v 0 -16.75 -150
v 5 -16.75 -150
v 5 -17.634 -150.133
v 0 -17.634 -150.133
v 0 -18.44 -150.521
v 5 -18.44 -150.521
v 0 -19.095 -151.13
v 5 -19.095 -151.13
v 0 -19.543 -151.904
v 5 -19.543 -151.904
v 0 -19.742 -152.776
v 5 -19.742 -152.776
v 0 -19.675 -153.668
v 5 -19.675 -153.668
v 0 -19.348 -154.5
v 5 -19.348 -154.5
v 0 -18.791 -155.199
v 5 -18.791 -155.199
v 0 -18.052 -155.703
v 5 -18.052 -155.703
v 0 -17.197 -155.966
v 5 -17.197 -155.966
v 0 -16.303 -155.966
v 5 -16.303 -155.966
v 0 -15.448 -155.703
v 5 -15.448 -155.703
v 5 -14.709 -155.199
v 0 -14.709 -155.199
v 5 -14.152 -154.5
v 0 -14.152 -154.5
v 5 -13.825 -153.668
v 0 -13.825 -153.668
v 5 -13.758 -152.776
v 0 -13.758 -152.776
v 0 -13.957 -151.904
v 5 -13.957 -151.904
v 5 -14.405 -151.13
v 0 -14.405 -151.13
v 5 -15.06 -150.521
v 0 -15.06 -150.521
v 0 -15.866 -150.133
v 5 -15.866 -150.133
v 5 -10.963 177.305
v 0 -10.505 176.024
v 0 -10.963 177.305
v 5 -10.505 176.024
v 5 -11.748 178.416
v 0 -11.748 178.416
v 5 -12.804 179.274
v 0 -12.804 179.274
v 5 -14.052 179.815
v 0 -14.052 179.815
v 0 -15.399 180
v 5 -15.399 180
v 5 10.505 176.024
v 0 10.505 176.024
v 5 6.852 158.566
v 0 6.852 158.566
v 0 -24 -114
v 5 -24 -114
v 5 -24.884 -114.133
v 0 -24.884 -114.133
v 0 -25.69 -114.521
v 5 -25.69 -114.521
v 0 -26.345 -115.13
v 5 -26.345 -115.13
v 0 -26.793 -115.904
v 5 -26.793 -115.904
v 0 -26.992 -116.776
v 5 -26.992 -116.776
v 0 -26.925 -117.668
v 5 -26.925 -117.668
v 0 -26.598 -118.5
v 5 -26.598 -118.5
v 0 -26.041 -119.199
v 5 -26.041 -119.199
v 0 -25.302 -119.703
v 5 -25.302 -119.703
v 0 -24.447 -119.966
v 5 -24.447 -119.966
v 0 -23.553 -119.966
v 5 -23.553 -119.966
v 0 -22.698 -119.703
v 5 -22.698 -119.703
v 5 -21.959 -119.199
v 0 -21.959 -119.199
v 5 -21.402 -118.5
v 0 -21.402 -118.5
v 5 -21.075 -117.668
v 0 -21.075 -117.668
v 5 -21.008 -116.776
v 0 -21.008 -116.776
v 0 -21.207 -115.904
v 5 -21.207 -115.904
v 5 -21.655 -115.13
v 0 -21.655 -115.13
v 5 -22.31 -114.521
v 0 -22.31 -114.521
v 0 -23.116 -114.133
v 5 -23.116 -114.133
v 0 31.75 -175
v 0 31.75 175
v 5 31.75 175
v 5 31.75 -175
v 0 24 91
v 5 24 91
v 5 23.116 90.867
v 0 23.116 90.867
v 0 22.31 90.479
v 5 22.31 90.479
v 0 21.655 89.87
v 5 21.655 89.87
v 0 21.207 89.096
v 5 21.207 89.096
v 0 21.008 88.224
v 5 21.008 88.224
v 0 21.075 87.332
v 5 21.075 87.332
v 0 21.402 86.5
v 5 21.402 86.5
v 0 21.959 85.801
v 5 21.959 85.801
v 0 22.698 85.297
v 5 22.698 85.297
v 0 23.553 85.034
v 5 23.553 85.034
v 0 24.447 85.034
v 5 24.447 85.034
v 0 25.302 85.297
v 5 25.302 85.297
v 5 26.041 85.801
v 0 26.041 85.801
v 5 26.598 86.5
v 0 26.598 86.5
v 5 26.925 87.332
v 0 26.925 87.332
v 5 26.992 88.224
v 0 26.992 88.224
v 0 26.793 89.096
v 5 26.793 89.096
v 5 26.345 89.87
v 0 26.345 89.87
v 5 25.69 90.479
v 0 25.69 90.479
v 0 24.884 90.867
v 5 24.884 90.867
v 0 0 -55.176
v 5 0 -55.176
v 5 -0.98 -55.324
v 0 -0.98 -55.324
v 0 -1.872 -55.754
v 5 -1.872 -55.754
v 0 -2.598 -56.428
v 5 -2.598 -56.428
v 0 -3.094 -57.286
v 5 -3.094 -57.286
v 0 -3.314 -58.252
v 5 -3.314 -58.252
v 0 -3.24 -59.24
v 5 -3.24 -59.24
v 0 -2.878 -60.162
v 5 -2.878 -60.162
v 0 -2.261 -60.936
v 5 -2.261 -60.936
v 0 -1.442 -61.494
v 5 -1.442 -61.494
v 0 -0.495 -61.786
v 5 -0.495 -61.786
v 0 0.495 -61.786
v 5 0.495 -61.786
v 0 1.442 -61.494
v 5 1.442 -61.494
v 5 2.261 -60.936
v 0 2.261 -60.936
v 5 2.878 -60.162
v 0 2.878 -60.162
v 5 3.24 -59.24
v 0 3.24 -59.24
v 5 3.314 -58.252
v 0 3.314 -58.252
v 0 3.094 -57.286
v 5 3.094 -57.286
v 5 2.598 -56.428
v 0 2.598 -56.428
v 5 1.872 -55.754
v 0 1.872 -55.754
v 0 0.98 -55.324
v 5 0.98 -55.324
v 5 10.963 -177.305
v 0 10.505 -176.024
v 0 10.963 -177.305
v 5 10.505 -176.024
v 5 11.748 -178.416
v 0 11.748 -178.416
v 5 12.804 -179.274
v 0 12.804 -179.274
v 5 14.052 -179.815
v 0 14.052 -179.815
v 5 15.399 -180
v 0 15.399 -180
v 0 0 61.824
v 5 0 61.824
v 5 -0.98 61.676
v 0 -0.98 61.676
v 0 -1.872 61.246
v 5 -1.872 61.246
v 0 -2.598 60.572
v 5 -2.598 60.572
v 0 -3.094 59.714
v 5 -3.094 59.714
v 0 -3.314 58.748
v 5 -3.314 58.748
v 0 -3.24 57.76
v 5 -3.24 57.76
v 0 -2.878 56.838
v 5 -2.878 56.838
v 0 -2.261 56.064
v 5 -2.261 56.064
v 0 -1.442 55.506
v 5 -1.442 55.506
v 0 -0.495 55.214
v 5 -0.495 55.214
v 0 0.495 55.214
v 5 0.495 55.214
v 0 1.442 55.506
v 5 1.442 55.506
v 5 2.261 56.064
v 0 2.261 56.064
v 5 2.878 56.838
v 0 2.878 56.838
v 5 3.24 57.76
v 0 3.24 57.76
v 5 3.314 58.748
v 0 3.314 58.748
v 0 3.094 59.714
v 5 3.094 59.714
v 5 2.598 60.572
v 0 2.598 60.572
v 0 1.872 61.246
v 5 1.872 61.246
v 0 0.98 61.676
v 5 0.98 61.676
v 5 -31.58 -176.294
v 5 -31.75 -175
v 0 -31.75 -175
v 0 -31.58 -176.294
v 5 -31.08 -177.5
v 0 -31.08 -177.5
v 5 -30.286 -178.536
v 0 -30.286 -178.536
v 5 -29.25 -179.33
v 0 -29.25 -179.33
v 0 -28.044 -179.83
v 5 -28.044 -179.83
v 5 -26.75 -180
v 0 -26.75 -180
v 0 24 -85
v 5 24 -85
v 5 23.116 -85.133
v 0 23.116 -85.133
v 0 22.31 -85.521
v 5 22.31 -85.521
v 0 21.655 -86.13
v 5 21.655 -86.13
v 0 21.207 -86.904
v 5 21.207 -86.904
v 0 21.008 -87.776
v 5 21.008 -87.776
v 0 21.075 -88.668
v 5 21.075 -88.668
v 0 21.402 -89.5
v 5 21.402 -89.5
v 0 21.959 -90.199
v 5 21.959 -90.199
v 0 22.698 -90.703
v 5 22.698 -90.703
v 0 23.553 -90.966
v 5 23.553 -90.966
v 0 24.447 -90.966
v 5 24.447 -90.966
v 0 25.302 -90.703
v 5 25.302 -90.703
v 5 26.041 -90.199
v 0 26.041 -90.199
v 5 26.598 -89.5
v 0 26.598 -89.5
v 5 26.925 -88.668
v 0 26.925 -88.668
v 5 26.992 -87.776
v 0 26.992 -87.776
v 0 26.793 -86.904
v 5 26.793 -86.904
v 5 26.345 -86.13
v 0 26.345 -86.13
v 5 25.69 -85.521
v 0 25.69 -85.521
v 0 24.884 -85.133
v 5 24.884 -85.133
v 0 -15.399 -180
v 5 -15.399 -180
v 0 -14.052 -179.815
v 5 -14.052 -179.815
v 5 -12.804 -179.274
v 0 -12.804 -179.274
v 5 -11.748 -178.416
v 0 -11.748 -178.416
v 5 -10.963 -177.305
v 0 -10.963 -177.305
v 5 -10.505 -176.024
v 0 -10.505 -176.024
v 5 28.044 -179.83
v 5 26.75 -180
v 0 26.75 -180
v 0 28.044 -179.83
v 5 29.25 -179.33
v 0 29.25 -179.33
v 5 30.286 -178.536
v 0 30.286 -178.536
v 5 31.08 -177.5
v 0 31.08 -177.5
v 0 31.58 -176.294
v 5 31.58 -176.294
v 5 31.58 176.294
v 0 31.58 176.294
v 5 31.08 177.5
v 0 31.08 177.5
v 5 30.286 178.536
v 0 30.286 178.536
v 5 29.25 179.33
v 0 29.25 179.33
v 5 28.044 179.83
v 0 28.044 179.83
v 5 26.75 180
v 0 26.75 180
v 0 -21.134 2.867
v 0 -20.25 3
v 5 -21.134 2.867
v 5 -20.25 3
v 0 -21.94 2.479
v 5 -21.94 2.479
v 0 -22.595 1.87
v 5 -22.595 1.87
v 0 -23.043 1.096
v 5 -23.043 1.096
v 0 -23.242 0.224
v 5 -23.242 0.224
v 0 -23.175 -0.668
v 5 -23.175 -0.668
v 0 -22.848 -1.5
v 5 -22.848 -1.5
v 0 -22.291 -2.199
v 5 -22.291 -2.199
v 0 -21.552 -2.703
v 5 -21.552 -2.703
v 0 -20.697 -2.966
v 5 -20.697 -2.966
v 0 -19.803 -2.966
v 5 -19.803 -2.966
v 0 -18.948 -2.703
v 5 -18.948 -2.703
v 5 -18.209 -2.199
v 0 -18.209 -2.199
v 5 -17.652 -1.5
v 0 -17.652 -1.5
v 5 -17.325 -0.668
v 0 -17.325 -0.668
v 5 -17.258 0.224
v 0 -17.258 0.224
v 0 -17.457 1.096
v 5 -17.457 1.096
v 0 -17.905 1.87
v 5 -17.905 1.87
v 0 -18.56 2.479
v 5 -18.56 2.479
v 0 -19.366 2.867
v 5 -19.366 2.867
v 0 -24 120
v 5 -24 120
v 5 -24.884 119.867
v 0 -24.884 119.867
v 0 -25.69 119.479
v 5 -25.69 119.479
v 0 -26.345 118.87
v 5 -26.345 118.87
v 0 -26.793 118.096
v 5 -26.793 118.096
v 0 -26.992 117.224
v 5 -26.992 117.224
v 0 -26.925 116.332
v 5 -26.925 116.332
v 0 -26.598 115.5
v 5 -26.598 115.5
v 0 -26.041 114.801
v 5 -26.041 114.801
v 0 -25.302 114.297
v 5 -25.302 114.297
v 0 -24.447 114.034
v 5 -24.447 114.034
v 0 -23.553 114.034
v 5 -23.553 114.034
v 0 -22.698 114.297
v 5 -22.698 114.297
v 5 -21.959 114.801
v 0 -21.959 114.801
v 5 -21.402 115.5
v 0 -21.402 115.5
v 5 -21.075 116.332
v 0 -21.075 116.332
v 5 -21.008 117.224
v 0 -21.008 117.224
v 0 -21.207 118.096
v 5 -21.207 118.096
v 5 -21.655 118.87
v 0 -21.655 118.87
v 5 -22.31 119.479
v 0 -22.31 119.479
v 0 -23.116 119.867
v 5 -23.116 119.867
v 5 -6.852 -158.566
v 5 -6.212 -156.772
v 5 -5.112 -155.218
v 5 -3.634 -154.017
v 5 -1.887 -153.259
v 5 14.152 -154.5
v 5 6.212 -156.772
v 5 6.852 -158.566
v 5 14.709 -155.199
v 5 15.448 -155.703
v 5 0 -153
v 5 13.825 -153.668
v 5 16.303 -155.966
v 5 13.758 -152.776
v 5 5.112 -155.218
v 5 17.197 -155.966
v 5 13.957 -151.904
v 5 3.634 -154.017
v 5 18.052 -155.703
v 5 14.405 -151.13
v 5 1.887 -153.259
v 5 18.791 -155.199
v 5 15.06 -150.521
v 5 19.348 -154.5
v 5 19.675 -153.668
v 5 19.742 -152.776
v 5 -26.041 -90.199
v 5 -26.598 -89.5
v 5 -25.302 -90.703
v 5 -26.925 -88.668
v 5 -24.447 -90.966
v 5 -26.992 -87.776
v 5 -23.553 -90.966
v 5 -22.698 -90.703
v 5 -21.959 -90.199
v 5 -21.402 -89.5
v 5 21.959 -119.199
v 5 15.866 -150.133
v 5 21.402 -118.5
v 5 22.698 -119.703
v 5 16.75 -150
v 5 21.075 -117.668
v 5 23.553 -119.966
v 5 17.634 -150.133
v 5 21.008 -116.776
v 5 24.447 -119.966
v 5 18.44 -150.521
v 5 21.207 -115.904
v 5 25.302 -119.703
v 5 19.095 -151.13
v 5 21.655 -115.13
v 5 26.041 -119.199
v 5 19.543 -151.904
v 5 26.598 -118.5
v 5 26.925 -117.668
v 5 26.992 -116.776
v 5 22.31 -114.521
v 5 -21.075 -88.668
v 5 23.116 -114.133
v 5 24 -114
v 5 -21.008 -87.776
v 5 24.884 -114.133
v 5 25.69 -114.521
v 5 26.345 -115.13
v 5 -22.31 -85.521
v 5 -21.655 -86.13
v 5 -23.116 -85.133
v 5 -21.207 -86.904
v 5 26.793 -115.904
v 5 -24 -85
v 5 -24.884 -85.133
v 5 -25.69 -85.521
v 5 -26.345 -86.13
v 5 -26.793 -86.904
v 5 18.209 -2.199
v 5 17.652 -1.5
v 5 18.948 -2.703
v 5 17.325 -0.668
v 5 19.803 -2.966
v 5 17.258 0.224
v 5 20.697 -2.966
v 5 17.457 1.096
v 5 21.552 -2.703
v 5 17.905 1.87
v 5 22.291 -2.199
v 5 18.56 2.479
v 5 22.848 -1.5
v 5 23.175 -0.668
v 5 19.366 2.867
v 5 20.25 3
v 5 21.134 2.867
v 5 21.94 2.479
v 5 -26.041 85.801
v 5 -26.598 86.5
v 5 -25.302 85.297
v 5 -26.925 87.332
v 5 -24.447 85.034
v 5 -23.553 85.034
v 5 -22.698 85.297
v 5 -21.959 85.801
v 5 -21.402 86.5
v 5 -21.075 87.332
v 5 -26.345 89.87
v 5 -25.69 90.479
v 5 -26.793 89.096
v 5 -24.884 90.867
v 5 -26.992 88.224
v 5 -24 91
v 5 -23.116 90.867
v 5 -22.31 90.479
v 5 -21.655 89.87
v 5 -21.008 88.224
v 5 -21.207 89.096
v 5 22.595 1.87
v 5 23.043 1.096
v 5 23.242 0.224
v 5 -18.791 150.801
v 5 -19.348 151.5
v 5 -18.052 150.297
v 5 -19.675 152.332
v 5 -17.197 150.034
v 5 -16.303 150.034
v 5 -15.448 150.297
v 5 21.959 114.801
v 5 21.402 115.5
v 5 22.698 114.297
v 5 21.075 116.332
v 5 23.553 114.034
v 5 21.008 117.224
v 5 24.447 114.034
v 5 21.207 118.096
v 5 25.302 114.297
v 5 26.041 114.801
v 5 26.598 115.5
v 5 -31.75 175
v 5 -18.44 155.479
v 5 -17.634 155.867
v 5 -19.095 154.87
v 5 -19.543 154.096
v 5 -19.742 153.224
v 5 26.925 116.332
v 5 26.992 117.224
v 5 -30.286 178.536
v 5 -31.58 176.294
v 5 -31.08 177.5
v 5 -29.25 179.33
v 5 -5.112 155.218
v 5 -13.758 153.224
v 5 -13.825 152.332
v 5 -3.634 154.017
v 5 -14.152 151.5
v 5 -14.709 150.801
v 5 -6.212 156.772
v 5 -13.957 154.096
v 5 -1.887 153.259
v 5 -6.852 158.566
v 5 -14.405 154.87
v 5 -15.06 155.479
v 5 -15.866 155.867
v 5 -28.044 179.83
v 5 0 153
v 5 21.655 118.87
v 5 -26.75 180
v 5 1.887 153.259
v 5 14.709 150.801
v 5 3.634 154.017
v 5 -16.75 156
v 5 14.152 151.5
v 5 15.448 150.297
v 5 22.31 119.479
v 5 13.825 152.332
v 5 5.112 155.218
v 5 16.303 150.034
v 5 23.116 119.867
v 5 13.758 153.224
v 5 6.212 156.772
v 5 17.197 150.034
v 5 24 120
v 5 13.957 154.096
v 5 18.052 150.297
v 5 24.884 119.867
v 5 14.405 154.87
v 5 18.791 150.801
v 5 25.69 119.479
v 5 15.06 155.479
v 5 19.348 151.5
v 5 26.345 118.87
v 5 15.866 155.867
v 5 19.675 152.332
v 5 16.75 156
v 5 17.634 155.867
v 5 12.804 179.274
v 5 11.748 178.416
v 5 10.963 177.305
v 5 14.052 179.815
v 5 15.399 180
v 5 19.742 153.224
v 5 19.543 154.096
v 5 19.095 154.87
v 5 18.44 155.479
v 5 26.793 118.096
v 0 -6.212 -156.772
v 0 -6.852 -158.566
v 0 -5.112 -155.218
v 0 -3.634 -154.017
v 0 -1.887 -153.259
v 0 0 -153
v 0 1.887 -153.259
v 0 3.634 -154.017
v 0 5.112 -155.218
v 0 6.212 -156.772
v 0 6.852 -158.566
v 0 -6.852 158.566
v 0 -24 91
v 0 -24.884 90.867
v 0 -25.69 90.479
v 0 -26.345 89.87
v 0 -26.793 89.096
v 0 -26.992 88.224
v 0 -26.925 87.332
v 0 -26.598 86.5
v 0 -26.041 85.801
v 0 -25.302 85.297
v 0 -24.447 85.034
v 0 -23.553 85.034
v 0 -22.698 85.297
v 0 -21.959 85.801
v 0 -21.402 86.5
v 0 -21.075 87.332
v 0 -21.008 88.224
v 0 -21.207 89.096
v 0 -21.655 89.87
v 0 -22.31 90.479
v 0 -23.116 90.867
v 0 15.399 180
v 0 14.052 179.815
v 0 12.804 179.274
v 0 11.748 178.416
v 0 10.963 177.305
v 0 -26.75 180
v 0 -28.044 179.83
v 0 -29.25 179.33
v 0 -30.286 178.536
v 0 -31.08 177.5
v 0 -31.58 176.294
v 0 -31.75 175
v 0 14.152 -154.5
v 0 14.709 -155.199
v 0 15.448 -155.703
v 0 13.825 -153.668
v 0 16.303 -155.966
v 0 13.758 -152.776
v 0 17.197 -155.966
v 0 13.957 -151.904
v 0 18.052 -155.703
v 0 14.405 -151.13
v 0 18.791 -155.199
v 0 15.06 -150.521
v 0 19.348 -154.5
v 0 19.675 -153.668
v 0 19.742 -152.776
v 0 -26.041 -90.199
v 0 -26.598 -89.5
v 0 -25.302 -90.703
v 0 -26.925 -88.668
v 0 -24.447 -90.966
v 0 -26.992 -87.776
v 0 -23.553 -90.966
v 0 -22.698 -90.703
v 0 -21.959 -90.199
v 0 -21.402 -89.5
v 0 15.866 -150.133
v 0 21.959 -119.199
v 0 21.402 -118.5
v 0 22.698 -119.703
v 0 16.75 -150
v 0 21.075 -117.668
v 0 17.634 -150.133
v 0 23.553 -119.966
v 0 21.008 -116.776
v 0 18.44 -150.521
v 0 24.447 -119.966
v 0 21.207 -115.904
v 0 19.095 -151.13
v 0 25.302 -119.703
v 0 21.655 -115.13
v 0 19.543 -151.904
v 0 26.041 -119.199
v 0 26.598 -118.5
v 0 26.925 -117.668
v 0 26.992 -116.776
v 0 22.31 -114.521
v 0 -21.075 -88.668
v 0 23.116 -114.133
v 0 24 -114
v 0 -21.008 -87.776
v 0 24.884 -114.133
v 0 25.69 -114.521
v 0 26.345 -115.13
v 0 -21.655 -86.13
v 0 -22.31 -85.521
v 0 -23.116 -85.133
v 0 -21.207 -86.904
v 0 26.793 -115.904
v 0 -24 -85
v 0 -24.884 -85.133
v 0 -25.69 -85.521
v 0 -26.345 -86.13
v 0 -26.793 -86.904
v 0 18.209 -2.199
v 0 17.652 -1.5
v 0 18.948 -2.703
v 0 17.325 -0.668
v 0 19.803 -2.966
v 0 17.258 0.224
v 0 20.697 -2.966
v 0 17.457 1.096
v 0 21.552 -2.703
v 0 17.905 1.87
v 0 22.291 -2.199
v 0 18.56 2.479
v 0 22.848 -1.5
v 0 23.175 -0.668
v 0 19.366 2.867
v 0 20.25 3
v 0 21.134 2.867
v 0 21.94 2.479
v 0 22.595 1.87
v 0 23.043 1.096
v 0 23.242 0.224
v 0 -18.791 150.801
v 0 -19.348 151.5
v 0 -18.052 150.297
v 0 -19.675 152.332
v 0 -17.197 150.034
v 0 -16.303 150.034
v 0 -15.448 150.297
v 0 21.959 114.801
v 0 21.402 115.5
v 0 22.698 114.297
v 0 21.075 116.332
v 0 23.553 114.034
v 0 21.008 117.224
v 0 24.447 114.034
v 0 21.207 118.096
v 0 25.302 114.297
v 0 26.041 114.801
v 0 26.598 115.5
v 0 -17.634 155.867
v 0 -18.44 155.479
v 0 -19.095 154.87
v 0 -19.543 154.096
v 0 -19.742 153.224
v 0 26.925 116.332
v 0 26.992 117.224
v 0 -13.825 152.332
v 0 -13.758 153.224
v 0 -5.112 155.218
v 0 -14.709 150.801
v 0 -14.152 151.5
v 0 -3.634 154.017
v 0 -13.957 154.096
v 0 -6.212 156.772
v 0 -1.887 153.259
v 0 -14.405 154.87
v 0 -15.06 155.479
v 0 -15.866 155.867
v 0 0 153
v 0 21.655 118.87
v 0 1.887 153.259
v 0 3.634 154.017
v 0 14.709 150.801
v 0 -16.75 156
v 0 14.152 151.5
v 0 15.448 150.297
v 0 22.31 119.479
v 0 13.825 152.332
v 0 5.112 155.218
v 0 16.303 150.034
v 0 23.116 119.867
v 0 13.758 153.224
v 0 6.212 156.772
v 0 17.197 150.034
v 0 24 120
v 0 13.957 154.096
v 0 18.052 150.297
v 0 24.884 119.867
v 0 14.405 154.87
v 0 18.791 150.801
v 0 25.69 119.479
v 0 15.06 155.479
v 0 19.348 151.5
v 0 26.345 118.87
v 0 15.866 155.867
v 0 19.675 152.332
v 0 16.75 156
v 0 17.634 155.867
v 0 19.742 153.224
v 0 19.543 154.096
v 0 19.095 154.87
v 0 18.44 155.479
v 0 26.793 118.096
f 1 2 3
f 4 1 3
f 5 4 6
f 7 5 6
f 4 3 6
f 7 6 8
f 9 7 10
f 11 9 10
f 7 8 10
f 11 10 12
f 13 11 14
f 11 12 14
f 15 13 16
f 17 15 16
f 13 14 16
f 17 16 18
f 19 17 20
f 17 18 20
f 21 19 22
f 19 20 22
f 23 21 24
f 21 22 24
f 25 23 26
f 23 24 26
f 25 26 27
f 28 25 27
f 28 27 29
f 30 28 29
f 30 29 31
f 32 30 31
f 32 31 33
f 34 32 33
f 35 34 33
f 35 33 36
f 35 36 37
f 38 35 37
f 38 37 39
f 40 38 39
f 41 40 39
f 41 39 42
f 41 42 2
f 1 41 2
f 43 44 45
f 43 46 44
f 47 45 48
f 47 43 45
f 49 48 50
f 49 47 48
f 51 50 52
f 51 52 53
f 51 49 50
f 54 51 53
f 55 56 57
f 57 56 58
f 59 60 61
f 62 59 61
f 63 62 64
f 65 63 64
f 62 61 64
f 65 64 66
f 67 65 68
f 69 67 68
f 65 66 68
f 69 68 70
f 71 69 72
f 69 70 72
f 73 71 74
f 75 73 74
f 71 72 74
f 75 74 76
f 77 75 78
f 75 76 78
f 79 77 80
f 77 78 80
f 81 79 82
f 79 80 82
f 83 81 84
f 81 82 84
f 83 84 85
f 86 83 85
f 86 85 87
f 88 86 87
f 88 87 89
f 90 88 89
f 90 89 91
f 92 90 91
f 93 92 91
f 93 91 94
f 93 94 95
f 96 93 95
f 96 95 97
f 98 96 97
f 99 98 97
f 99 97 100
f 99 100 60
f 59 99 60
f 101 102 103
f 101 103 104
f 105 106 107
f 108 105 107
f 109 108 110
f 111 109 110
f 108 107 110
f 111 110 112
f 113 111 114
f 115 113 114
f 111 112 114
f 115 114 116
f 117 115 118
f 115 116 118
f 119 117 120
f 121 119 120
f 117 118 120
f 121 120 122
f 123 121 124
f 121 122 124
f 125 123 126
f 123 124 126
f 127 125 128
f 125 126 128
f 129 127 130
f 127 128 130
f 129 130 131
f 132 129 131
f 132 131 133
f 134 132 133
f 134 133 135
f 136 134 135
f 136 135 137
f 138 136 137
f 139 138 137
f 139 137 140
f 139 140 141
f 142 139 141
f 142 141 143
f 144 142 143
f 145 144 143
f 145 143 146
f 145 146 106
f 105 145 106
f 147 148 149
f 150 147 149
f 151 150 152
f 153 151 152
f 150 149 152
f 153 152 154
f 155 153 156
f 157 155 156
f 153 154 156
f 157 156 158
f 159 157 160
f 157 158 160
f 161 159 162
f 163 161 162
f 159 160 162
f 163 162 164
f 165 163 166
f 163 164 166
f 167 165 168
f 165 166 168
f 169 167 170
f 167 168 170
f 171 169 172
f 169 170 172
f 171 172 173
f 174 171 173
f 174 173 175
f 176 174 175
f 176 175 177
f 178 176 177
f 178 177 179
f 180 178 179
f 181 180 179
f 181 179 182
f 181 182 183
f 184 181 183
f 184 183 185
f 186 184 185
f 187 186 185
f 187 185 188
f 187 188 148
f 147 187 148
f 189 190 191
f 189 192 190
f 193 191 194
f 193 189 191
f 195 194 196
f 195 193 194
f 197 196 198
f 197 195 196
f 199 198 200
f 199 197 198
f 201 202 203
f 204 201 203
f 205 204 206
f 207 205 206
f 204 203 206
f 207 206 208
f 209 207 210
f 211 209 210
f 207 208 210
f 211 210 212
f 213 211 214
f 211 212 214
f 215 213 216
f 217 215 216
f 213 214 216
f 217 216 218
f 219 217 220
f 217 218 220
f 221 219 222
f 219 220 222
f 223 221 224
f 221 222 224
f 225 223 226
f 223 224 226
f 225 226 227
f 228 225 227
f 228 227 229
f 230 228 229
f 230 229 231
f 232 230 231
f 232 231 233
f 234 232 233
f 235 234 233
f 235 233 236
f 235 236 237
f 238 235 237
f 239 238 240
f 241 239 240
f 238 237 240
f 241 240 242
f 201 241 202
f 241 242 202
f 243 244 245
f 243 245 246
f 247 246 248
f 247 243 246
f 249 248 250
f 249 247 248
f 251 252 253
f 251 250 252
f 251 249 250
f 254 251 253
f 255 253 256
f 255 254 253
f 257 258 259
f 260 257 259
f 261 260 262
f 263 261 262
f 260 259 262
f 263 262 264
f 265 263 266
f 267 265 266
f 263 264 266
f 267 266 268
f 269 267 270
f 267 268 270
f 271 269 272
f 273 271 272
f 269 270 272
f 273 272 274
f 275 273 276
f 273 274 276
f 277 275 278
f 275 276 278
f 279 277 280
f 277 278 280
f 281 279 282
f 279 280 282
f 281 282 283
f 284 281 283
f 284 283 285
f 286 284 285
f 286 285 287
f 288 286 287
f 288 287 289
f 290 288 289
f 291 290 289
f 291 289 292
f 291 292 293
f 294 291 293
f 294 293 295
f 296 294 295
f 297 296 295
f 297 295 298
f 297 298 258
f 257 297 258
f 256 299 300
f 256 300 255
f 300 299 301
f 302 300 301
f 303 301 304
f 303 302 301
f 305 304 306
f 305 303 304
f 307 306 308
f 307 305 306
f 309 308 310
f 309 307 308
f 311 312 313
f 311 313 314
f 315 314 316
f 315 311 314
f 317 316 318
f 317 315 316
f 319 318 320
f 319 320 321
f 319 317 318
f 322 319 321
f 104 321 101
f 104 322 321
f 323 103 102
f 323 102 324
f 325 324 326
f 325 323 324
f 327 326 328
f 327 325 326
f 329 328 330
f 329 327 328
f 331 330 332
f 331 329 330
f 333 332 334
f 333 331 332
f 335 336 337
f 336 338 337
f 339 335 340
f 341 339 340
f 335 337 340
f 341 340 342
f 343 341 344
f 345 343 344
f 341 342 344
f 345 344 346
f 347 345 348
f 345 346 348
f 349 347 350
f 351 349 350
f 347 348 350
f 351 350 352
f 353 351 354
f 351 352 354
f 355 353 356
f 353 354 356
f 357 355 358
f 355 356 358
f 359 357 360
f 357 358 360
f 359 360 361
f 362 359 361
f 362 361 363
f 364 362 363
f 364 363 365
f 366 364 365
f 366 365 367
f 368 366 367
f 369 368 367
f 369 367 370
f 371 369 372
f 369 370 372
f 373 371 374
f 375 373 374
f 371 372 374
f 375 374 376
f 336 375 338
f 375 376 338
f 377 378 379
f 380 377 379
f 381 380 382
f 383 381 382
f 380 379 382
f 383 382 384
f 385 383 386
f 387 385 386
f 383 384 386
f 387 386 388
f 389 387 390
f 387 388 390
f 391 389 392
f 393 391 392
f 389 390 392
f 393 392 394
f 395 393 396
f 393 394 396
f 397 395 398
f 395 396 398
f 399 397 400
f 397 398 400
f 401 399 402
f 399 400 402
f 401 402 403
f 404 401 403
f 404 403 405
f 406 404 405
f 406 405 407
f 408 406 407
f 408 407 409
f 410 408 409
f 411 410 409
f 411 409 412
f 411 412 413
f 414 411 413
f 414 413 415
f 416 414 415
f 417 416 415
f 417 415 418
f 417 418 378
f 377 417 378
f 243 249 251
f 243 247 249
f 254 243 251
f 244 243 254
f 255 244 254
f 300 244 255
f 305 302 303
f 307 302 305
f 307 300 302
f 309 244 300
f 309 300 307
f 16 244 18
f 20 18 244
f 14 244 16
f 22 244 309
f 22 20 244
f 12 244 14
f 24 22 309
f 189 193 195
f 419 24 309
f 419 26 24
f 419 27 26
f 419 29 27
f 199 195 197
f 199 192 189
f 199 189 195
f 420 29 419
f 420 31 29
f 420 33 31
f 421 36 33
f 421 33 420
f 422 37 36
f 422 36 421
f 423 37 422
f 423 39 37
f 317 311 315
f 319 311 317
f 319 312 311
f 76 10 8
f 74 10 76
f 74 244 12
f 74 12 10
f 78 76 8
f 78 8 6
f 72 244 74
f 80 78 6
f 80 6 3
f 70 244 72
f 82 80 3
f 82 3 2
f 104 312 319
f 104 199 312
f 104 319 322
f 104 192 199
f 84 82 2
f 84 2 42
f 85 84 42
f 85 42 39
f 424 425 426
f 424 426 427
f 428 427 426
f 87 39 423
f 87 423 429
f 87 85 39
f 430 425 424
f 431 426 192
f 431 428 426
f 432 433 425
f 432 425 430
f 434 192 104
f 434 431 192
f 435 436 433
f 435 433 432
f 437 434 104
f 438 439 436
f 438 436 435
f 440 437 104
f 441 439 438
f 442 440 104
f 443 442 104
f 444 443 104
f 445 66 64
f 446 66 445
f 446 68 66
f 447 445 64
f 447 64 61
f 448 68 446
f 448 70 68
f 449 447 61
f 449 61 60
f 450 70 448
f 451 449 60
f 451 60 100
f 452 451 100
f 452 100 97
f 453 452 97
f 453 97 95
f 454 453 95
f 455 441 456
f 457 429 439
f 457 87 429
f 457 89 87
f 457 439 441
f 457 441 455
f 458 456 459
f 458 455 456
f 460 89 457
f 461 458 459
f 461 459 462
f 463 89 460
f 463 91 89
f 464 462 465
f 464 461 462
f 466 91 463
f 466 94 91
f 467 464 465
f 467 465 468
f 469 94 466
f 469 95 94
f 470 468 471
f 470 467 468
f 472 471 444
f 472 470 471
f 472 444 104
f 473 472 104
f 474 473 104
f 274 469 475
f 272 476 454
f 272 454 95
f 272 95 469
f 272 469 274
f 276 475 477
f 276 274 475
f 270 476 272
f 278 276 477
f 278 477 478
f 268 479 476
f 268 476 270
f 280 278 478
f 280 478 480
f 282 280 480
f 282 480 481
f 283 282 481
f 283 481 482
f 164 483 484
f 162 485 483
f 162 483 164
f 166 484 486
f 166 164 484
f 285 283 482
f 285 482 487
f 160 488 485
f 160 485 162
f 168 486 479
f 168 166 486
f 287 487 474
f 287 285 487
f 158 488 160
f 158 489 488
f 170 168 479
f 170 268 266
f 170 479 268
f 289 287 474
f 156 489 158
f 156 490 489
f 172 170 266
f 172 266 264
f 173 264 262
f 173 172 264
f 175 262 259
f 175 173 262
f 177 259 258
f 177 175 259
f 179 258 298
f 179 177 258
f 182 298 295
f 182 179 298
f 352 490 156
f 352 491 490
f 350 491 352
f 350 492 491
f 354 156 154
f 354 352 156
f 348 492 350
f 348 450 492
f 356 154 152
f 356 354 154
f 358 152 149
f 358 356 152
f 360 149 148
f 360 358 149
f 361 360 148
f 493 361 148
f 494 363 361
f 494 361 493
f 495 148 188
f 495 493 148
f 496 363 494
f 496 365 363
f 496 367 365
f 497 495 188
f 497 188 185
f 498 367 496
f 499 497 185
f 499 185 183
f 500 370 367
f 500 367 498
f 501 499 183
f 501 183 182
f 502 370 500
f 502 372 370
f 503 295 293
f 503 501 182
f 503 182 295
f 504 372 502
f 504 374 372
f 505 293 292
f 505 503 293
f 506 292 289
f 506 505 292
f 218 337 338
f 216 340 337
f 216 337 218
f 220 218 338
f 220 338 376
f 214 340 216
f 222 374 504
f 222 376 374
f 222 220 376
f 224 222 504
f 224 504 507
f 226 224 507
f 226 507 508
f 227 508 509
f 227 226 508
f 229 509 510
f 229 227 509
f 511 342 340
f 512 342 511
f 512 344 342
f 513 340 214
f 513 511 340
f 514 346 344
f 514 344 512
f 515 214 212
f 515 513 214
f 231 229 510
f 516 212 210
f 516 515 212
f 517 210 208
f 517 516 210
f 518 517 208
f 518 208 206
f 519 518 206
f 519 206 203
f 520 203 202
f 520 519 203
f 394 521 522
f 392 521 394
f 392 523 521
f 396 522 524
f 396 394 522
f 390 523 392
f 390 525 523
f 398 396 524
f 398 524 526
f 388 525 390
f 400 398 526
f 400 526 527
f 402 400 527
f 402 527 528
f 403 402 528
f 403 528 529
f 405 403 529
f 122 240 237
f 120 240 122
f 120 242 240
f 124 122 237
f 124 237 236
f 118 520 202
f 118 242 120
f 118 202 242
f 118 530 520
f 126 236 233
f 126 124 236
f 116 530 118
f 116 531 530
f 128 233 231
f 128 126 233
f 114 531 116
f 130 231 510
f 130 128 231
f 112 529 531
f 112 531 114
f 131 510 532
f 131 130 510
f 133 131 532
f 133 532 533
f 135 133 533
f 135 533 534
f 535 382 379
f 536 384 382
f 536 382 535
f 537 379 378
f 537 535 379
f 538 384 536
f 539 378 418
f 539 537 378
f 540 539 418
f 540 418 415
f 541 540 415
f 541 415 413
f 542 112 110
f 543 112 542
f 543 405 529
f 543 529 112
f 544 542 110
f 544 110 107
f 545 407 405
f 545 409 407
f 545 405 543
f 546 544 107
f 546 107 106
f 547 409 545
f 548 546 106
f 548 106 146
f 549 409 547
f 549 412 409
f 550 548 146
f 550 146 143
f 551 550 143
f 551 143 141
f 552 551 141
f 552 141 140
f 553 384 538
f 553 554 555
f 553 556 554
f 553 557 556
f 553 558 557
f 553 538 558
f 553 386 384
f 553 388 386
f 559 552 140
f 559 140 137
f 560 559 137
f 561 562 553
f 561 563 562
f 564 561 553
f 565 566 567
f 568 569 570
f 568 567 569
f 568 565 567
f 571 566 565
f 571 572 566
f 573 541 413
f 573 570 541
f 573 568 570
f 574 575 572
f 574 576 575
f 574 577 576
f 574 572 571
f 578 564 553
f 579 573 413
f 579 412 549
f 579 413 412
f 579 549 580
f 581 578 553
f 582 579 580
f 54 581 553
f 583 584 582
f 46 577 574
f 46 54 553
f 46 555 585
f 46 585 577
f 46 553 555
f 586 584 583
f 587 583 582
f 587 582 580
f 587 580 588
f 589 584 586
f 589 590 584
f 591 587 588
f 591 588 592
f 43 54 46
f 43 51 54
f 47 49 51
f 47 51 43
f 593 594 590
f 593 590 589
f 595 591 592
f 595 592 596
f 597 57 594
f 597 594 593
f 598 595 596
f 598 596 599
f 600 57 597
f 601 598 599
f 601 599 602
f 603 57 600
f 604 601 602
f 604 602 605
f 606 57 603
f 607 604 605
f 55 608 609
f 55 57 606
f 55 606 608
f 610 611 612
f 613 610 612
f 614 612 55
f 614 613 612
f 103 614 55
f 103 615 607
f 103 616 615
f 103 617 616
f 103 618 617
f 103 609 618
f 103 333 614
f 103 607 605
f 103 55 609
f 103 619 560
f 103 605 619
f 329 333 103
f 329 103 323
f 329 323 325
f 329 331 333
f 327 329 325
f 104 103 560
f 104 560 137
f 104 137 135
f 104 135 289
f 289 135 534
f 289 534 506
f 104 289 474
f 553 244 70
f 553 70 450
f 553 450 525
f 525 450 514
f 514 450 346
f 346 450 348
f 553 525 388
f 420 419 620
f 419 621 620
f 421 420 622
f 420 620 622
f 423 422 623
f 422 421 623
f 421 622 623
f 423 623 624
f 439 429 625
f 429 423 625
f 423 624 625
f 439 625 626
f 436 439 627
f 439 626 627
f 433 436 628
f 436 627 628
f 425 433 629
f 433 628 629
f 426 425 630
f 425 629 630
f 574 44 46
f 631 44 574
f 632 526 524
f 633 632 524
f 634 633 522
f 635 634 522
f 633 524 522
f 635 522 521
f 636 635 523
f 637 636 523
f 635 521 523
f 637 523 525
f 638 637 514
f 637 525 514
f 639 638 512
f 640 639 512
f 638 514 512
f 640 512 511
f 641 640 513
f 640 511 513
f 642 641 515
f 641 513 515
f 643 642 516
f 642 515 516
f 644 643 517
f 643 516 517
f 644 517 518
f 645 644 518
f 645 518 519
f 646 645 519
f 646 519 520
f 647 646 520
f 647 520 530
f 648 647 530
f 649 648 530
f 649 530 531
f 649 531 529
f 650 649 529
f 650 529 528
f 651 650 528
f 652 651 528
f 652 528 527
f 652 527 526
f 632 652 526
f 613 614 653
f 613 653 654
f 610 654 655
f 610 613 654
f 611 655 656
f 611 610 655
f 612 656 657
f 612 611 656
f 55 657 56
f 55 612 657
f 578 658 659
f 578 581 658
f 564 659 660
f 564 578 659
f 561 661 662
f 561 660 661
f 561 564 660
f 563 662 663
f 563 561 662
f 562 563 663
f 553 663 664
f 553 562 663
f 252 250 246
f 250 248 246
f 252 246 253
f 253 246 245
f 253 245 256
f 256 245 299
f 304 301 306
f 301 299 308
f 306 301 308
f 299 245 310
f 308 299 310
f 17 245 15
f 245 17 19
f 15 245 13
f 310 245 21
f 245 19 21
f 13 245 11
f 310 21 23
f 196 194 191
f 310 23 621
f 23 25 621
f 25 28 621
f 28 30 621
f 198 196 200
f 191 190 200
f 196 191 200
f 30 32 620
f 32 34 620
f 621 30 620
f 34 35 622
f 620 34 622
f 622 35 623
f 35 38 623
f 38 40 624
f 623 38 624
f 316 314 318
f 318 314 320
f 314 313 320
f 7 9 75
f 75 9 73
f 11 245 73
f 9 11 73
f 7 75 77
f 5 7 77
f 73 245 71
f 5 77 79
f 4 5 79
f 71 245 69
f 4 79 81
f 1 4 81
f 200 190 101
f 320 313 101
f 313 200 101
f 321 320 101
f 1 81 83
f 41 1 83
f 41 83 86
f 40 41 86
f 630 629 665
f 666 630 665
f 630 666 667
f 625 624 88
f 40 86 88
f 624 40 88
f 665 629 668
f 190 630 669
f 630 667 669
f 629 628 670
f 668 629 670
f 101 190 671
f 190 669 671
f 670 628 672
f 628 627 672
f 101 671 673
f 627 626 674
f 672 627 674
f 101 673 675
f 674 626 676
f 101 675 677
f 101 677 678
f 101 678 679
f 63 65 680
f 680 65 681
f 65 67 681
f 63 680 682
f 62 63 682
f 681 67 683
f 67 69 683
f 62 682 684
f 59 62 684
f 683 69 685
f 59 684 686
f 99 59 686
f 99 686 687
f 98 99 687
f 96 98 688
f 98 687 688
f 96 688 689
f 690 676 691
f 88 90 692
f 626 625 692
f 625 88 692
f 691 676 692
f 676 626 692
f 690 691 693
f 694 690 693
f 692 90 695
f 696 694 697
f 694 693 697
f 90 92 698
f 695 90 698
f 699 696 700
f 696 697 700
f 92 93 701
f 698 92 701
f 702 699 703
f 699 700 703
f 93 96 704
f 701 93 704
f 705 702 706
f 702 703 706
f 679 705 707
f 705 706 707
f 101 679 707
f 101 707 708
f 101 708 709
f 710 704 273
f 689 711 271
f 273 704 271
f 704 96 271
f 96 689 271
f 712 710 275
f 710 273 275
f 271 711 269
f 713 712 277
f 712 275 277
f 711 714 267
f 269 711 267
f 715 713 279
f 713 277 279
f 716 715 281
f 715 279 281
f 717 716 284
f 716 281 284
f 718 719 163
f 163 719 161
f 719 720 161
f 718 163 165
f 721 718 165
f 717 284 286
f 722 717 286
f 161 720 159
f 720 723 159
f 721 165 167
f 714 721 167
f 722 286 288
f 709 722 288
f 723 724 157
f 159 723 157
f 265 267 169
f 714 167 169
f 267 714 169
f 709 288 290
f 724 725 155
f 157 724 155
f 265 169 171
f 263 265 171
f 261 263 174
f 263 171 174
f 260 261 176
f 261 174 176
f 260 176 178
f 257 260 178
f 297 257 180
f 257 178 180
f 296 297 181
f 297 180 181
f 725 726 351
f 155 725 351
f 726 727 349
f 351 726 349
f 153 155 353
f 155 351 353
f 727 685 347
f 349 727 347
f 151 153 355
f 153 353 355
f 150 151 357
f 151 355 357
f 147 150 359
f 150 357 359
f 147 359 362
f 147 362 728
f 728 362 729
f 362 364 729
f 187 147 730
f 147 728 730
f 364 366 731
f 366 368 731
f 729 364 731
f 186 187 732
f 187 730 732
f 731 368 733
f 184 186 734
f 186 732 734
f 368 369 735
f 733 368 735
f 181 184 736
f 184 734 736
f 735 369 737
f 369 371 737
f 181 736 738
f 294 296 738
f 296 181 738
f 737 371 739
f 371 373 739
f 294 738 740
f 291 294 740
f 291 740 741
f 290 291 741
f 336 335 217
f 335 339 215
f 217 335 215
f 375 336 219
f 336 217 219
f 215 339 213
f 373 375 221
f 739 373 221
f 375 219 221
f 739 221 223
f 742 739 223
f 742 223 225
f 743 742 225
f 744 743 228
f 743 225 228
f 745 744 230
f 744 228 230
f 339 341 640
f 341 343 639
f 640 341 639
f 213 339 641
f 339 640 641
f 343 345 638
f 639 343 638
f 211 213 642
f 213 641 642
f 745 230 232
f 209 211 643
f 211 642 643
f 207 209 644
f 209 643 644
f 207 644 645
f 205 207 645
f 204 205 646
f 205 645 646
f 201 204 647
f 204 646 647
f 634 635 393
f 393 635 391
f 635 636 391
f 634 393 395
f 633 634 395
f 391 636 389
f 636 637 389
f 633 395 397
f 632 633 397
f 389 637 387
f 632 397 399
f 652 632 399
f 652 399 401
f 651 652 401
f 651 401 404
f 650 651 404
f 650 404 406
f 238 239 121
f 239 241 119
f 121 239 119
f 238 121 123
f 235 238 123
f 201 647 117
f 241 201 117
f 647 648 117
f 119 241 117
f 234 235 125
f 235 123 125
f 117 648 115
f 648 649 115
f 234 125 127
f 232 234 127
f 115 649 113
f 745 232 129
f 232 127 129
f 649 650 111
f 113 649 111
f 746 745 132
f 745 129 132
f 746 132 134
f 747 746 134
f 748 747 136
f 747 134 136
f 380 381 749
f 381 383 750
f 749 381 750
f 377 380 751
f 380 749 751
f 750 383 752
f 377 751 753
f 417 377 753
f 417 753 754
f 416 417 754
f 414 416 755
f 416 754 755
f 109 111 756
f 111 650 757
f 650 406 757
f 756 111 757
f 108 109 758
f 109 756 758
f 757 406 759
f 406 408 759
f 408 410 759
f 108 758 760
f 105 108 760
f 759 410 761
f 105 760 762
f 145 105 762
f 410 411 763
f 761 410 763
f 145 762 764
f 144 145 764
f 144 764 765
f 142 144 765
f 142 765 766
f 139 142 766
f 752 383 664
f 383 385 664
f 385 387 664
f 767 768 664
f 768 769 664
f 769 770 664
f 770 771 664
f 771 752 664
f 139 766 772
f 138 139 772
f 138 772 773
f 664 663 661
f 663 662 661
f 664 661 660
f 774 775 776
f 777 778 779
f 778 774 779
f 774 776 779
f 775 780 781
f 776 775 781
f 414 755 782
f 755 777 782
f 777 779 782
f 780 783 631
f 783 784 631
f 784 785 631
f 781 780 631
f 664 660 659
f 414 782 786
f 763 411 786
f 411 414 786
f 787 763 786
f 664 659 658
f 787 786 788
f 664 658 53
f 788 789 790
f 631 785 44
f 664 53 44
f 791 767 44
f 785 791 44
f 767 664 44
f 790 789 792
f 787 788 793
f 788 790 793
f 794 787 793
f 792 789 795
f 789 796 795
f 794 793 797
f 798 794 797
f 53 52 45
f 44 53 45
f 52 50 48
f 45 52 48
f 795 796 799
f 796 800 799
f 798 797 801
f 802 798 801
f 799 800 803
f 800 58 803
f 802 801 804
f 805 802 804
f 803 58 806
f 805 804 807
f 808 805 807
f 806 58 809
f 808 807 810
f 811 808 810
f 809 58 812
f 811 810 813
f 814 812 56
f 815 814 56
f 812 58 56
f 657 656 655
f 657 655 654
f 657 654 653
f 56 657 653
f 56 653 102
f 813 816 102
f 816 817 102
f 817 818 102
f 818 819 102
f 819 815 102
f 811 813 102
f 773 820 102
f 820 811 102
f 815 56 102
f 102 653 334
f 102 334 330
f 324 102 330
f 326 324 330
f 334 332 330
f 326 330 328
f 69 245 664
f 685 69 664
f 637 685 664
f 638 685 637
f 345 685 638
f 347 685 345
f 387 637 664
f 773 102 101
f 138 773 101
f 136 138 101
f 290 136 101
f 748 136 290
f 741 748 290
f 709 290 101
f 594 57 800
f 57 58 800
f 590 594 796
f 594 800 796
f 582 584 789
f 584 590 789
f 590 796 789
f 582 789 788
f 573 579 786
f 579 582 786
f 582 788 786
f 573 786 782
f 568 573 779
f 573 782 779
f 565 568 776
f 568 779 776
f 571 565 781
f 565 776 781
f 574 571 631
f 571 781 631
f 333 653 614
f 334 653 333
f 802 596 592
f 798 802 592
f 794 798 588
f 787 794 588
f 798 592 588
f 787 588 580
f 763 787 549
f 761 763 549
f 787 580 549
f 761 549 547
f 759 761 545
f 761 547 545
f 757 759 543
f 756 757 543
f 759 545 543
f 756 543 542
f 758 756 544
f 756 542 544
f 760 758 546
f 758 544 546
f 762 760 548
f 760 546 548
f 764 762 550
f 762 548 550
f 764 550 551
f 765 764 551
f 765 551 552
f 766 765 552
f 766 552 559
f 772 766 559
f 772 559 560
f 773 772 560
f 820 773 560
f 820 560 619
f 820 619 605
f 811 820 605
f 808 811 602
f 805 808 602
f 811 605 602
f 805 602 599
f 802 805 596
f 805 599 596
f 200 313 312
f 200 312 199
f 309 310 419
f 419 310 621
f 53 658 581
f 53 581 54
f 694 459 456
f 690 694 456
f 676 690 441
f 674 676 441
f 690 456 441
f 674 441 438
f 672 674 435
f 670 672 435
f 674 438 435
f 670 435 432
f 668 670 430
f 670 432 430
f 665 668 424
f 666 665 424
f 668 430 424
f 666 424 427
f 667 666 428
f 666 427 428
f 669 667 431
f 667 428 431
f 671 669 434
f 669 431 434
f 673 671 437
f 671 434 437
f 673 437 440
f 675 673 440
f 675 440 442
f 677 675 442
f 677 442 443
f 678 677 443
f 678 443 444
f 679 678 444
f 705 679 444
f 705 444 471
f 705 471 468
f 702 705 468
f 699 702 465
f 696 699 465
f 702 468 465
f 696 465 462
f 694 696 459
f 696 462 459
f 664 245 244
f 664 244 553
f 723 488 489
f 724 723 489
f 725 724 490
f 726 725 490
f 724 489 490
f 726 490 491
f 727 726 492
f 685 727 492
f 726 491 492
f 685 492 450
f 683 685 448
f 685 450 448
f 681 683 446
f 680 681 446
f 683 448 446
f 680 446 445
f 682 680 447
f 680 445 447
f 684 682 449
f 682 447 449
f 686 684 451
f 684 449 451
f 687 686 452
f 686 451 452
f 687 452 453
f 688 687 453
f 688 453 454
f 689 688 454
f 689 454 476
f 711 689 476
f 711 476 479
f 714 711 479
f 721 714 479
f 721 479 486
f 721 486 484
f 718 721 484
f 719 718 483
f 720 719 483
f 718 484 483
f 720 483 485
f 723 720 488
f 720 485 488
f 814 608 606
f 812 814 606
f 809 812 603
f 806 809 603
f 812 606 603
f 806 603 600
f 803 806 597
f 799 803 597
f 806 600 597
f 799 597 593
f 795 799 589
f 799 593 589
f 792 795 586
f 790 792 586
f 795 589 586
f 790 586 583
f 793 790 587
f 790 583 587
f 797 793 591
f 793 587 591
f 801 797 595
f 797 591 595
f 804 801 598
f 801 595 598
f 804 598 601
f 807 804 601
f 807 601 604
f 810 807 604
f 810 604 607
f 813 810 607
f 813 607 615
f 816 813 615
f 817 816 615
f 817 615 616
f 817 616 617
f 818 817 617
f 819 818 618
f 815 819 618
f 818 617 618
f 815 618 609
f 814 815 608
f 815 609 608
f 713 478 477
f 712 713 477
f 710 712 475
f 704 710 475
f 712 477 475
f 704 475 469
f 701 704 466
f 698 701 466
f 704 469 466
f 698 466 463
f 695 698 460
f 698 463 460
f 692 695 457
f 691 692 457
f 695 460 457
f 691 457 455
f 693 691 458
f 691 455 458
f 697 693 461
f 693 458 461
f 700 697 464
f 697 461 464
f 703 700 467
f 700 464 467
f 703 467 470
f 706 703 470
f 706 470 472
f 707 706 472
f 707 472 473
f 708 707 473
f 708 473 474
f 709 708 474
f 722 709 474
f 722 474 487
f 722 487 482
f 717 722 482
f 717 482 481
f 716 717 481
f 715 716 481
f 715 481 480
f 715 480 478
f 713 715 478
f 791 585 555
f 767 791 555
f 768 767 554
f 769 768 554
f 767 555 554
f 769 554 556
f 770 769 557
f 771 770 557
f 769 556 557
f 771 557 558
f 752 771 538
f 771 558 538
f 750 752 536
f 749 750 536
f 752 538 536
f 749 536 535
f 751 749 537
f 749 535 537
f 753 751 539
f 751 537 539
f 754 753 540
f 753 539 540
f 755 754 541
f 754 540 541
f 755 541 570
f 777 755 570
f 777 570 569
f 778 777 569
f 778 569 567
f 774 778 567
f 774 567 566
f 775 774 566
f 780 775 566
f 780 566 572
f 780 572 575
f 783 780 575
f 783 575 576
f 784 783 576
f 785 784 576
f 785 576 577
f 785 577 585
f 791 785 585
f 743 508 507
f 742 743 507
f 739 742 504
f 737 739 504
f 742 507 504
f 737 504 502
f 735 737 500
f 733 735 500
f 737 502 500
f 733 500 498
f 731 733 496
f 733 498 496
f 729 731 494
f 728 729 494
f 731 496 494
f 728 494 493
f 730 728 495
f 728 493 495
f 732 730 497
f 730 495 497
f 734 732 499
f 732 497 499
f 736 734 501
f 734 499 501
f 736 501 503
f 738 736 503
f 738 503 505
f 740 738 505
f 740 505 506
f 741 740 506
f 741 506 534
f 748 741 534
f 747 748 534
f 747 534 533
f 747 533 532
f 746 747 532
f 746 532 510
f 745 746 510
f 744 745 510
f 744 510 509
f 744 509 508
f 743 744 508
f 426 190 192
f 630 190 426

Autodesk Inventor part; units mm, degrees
ref_plane "YZ Plane" through (0, 0, 0) normal (1, 0, 0) x (0, 1, 0)
ref_plane "XZ Plane" through (0, 0, 0) normal (0, 1, 0) x (-1, 0, 0)
ref_plane "XY Plane" through (0, 0, 0) normal (0, 0, 1) x (1, 0, 0)
sketch "Sketch1" plane through (0, 0, 0) normal (1, 0, 0) x (0, 1, 0)
  line L0 (31.75, -180) -> (-31.75, -180)
  line L1 (-31.75, -180) -> (-31.75, 180)
  line L2 (-31.75, 180) -> (31.75, 180)
  line L3 (31.75, 180) -> (31.75, -180)
  line L4 (31.75, -180) -> (-31.75, 180) construction
  line L5 (-31.75, -180) -> (31.75, 180) construction
  line L6 (-31.75, 0) -> (31.75, 0) construction
  line L7 (0, 180) -> (0, -180) construction
  line L8 (24, -88) -> (-24, -88) construction
  line L9 (24, -117) -> (-24, -117) construction
  line L10 (16.75, -153) -> (-16.75, -153) construction
  line L11 (24, 88) -> (-24, 88) construction
  line L12 (24, 117) -> (-24, 117) construction
  line L13 (16.75, 153) -> (-16.75, 153) construction
  line L14 (24, -117) -> (24, -88) construction
  arc A0 (-6.8516, 158.566) -> (6.8516, 158.566) centre (0, 160) ccw
  line L15 (-15, 197.5) -> (15, 197.5)
  line L16 (15, 197.5) -> (6.8516, 158.566)
  line L17 (-15, 197.5) -> (-6.8516, 158.566)
  arc A1 (6.8516, -158.566) -> (-6.8516, -158.566) centre (0, -160) ccw
  line L18 (-15, -197.5) -> (15, -197.5)
  line L19 (15, -197.5) -> (6.8516, -158.566)
  line L20 (-15, -197.5) -> (-6.8516, -158.566)
  point P0 (0, 0)
  point P1 (-20.25, 0)
  point P2 (20.25, 0)
  point P3 (0, 153)
  point P4 (-11.3374, -180)
  point P5 (11.3374, -180)
  point P6 (11.3374, 180)
  point P7 (-11.3374, 180)
  point P8 (0, 58.5)
  point P9 (0, -58.5)
  dimension "d0" = 63.5
  dimension "d1" = 360
  dimension "d2" = 40.5
  dimension "d3" = 176
  dimension "d4" = 29
  dimension "d5" = 48
  dimension "d6" = 33.5
  dimension "d7" = 306
  dimension "d8" = 30
  dimension "d9" = 37.5
  dimension "d10" = 14
  dimension "d11" = 320
  dimension "d21" = 117
extrude "Extrusion1" add sketch "Sketch1" along normal blind 5 contours L0 L19 A1 L20 L1 L2 L17 A0 L16 L3
hole "Hole1" at (0, -20.25, 0) at (0, 20.25, 0) at (0, 24, -88) at (0, 24, -117) at (0, 16.75, -153) at (0, -24, -88) at (0, -24, -117) at (0, -16.75, -153) at (0, 24, 88) at (0, 24, 117) at (0, 16.75, 153) at (0, -16.75, 153) at (0, -24, 117) at (0, -24, 88) at (0, 0, 160) at (0, 0, -160) direction (1, 0, 0) diameter 6 end through all
hole "Hole2" at (0, 0, 58.5) at (0, 0, -58.5) direction (1, 0, 0) diameter 6.647 end through all thread size "M8x1.25" class "6H" standard "ANSI Metric M Profile"
fillet "Fillet1" radius 5 8 edges at (2.5, 31.75, 180) (2.5, -31.75, 180) (2.5, 31.75, -180) (2.5, 11.3374, -180) (2.5, -11.3374, -180) (2.5, -31.75, -180) (2.5, -11.3374, 180) (2.5, 11.3374, 180)
properties part number "ServoMotorsInitialPositioningFrame" material "Aluminum 7075"
